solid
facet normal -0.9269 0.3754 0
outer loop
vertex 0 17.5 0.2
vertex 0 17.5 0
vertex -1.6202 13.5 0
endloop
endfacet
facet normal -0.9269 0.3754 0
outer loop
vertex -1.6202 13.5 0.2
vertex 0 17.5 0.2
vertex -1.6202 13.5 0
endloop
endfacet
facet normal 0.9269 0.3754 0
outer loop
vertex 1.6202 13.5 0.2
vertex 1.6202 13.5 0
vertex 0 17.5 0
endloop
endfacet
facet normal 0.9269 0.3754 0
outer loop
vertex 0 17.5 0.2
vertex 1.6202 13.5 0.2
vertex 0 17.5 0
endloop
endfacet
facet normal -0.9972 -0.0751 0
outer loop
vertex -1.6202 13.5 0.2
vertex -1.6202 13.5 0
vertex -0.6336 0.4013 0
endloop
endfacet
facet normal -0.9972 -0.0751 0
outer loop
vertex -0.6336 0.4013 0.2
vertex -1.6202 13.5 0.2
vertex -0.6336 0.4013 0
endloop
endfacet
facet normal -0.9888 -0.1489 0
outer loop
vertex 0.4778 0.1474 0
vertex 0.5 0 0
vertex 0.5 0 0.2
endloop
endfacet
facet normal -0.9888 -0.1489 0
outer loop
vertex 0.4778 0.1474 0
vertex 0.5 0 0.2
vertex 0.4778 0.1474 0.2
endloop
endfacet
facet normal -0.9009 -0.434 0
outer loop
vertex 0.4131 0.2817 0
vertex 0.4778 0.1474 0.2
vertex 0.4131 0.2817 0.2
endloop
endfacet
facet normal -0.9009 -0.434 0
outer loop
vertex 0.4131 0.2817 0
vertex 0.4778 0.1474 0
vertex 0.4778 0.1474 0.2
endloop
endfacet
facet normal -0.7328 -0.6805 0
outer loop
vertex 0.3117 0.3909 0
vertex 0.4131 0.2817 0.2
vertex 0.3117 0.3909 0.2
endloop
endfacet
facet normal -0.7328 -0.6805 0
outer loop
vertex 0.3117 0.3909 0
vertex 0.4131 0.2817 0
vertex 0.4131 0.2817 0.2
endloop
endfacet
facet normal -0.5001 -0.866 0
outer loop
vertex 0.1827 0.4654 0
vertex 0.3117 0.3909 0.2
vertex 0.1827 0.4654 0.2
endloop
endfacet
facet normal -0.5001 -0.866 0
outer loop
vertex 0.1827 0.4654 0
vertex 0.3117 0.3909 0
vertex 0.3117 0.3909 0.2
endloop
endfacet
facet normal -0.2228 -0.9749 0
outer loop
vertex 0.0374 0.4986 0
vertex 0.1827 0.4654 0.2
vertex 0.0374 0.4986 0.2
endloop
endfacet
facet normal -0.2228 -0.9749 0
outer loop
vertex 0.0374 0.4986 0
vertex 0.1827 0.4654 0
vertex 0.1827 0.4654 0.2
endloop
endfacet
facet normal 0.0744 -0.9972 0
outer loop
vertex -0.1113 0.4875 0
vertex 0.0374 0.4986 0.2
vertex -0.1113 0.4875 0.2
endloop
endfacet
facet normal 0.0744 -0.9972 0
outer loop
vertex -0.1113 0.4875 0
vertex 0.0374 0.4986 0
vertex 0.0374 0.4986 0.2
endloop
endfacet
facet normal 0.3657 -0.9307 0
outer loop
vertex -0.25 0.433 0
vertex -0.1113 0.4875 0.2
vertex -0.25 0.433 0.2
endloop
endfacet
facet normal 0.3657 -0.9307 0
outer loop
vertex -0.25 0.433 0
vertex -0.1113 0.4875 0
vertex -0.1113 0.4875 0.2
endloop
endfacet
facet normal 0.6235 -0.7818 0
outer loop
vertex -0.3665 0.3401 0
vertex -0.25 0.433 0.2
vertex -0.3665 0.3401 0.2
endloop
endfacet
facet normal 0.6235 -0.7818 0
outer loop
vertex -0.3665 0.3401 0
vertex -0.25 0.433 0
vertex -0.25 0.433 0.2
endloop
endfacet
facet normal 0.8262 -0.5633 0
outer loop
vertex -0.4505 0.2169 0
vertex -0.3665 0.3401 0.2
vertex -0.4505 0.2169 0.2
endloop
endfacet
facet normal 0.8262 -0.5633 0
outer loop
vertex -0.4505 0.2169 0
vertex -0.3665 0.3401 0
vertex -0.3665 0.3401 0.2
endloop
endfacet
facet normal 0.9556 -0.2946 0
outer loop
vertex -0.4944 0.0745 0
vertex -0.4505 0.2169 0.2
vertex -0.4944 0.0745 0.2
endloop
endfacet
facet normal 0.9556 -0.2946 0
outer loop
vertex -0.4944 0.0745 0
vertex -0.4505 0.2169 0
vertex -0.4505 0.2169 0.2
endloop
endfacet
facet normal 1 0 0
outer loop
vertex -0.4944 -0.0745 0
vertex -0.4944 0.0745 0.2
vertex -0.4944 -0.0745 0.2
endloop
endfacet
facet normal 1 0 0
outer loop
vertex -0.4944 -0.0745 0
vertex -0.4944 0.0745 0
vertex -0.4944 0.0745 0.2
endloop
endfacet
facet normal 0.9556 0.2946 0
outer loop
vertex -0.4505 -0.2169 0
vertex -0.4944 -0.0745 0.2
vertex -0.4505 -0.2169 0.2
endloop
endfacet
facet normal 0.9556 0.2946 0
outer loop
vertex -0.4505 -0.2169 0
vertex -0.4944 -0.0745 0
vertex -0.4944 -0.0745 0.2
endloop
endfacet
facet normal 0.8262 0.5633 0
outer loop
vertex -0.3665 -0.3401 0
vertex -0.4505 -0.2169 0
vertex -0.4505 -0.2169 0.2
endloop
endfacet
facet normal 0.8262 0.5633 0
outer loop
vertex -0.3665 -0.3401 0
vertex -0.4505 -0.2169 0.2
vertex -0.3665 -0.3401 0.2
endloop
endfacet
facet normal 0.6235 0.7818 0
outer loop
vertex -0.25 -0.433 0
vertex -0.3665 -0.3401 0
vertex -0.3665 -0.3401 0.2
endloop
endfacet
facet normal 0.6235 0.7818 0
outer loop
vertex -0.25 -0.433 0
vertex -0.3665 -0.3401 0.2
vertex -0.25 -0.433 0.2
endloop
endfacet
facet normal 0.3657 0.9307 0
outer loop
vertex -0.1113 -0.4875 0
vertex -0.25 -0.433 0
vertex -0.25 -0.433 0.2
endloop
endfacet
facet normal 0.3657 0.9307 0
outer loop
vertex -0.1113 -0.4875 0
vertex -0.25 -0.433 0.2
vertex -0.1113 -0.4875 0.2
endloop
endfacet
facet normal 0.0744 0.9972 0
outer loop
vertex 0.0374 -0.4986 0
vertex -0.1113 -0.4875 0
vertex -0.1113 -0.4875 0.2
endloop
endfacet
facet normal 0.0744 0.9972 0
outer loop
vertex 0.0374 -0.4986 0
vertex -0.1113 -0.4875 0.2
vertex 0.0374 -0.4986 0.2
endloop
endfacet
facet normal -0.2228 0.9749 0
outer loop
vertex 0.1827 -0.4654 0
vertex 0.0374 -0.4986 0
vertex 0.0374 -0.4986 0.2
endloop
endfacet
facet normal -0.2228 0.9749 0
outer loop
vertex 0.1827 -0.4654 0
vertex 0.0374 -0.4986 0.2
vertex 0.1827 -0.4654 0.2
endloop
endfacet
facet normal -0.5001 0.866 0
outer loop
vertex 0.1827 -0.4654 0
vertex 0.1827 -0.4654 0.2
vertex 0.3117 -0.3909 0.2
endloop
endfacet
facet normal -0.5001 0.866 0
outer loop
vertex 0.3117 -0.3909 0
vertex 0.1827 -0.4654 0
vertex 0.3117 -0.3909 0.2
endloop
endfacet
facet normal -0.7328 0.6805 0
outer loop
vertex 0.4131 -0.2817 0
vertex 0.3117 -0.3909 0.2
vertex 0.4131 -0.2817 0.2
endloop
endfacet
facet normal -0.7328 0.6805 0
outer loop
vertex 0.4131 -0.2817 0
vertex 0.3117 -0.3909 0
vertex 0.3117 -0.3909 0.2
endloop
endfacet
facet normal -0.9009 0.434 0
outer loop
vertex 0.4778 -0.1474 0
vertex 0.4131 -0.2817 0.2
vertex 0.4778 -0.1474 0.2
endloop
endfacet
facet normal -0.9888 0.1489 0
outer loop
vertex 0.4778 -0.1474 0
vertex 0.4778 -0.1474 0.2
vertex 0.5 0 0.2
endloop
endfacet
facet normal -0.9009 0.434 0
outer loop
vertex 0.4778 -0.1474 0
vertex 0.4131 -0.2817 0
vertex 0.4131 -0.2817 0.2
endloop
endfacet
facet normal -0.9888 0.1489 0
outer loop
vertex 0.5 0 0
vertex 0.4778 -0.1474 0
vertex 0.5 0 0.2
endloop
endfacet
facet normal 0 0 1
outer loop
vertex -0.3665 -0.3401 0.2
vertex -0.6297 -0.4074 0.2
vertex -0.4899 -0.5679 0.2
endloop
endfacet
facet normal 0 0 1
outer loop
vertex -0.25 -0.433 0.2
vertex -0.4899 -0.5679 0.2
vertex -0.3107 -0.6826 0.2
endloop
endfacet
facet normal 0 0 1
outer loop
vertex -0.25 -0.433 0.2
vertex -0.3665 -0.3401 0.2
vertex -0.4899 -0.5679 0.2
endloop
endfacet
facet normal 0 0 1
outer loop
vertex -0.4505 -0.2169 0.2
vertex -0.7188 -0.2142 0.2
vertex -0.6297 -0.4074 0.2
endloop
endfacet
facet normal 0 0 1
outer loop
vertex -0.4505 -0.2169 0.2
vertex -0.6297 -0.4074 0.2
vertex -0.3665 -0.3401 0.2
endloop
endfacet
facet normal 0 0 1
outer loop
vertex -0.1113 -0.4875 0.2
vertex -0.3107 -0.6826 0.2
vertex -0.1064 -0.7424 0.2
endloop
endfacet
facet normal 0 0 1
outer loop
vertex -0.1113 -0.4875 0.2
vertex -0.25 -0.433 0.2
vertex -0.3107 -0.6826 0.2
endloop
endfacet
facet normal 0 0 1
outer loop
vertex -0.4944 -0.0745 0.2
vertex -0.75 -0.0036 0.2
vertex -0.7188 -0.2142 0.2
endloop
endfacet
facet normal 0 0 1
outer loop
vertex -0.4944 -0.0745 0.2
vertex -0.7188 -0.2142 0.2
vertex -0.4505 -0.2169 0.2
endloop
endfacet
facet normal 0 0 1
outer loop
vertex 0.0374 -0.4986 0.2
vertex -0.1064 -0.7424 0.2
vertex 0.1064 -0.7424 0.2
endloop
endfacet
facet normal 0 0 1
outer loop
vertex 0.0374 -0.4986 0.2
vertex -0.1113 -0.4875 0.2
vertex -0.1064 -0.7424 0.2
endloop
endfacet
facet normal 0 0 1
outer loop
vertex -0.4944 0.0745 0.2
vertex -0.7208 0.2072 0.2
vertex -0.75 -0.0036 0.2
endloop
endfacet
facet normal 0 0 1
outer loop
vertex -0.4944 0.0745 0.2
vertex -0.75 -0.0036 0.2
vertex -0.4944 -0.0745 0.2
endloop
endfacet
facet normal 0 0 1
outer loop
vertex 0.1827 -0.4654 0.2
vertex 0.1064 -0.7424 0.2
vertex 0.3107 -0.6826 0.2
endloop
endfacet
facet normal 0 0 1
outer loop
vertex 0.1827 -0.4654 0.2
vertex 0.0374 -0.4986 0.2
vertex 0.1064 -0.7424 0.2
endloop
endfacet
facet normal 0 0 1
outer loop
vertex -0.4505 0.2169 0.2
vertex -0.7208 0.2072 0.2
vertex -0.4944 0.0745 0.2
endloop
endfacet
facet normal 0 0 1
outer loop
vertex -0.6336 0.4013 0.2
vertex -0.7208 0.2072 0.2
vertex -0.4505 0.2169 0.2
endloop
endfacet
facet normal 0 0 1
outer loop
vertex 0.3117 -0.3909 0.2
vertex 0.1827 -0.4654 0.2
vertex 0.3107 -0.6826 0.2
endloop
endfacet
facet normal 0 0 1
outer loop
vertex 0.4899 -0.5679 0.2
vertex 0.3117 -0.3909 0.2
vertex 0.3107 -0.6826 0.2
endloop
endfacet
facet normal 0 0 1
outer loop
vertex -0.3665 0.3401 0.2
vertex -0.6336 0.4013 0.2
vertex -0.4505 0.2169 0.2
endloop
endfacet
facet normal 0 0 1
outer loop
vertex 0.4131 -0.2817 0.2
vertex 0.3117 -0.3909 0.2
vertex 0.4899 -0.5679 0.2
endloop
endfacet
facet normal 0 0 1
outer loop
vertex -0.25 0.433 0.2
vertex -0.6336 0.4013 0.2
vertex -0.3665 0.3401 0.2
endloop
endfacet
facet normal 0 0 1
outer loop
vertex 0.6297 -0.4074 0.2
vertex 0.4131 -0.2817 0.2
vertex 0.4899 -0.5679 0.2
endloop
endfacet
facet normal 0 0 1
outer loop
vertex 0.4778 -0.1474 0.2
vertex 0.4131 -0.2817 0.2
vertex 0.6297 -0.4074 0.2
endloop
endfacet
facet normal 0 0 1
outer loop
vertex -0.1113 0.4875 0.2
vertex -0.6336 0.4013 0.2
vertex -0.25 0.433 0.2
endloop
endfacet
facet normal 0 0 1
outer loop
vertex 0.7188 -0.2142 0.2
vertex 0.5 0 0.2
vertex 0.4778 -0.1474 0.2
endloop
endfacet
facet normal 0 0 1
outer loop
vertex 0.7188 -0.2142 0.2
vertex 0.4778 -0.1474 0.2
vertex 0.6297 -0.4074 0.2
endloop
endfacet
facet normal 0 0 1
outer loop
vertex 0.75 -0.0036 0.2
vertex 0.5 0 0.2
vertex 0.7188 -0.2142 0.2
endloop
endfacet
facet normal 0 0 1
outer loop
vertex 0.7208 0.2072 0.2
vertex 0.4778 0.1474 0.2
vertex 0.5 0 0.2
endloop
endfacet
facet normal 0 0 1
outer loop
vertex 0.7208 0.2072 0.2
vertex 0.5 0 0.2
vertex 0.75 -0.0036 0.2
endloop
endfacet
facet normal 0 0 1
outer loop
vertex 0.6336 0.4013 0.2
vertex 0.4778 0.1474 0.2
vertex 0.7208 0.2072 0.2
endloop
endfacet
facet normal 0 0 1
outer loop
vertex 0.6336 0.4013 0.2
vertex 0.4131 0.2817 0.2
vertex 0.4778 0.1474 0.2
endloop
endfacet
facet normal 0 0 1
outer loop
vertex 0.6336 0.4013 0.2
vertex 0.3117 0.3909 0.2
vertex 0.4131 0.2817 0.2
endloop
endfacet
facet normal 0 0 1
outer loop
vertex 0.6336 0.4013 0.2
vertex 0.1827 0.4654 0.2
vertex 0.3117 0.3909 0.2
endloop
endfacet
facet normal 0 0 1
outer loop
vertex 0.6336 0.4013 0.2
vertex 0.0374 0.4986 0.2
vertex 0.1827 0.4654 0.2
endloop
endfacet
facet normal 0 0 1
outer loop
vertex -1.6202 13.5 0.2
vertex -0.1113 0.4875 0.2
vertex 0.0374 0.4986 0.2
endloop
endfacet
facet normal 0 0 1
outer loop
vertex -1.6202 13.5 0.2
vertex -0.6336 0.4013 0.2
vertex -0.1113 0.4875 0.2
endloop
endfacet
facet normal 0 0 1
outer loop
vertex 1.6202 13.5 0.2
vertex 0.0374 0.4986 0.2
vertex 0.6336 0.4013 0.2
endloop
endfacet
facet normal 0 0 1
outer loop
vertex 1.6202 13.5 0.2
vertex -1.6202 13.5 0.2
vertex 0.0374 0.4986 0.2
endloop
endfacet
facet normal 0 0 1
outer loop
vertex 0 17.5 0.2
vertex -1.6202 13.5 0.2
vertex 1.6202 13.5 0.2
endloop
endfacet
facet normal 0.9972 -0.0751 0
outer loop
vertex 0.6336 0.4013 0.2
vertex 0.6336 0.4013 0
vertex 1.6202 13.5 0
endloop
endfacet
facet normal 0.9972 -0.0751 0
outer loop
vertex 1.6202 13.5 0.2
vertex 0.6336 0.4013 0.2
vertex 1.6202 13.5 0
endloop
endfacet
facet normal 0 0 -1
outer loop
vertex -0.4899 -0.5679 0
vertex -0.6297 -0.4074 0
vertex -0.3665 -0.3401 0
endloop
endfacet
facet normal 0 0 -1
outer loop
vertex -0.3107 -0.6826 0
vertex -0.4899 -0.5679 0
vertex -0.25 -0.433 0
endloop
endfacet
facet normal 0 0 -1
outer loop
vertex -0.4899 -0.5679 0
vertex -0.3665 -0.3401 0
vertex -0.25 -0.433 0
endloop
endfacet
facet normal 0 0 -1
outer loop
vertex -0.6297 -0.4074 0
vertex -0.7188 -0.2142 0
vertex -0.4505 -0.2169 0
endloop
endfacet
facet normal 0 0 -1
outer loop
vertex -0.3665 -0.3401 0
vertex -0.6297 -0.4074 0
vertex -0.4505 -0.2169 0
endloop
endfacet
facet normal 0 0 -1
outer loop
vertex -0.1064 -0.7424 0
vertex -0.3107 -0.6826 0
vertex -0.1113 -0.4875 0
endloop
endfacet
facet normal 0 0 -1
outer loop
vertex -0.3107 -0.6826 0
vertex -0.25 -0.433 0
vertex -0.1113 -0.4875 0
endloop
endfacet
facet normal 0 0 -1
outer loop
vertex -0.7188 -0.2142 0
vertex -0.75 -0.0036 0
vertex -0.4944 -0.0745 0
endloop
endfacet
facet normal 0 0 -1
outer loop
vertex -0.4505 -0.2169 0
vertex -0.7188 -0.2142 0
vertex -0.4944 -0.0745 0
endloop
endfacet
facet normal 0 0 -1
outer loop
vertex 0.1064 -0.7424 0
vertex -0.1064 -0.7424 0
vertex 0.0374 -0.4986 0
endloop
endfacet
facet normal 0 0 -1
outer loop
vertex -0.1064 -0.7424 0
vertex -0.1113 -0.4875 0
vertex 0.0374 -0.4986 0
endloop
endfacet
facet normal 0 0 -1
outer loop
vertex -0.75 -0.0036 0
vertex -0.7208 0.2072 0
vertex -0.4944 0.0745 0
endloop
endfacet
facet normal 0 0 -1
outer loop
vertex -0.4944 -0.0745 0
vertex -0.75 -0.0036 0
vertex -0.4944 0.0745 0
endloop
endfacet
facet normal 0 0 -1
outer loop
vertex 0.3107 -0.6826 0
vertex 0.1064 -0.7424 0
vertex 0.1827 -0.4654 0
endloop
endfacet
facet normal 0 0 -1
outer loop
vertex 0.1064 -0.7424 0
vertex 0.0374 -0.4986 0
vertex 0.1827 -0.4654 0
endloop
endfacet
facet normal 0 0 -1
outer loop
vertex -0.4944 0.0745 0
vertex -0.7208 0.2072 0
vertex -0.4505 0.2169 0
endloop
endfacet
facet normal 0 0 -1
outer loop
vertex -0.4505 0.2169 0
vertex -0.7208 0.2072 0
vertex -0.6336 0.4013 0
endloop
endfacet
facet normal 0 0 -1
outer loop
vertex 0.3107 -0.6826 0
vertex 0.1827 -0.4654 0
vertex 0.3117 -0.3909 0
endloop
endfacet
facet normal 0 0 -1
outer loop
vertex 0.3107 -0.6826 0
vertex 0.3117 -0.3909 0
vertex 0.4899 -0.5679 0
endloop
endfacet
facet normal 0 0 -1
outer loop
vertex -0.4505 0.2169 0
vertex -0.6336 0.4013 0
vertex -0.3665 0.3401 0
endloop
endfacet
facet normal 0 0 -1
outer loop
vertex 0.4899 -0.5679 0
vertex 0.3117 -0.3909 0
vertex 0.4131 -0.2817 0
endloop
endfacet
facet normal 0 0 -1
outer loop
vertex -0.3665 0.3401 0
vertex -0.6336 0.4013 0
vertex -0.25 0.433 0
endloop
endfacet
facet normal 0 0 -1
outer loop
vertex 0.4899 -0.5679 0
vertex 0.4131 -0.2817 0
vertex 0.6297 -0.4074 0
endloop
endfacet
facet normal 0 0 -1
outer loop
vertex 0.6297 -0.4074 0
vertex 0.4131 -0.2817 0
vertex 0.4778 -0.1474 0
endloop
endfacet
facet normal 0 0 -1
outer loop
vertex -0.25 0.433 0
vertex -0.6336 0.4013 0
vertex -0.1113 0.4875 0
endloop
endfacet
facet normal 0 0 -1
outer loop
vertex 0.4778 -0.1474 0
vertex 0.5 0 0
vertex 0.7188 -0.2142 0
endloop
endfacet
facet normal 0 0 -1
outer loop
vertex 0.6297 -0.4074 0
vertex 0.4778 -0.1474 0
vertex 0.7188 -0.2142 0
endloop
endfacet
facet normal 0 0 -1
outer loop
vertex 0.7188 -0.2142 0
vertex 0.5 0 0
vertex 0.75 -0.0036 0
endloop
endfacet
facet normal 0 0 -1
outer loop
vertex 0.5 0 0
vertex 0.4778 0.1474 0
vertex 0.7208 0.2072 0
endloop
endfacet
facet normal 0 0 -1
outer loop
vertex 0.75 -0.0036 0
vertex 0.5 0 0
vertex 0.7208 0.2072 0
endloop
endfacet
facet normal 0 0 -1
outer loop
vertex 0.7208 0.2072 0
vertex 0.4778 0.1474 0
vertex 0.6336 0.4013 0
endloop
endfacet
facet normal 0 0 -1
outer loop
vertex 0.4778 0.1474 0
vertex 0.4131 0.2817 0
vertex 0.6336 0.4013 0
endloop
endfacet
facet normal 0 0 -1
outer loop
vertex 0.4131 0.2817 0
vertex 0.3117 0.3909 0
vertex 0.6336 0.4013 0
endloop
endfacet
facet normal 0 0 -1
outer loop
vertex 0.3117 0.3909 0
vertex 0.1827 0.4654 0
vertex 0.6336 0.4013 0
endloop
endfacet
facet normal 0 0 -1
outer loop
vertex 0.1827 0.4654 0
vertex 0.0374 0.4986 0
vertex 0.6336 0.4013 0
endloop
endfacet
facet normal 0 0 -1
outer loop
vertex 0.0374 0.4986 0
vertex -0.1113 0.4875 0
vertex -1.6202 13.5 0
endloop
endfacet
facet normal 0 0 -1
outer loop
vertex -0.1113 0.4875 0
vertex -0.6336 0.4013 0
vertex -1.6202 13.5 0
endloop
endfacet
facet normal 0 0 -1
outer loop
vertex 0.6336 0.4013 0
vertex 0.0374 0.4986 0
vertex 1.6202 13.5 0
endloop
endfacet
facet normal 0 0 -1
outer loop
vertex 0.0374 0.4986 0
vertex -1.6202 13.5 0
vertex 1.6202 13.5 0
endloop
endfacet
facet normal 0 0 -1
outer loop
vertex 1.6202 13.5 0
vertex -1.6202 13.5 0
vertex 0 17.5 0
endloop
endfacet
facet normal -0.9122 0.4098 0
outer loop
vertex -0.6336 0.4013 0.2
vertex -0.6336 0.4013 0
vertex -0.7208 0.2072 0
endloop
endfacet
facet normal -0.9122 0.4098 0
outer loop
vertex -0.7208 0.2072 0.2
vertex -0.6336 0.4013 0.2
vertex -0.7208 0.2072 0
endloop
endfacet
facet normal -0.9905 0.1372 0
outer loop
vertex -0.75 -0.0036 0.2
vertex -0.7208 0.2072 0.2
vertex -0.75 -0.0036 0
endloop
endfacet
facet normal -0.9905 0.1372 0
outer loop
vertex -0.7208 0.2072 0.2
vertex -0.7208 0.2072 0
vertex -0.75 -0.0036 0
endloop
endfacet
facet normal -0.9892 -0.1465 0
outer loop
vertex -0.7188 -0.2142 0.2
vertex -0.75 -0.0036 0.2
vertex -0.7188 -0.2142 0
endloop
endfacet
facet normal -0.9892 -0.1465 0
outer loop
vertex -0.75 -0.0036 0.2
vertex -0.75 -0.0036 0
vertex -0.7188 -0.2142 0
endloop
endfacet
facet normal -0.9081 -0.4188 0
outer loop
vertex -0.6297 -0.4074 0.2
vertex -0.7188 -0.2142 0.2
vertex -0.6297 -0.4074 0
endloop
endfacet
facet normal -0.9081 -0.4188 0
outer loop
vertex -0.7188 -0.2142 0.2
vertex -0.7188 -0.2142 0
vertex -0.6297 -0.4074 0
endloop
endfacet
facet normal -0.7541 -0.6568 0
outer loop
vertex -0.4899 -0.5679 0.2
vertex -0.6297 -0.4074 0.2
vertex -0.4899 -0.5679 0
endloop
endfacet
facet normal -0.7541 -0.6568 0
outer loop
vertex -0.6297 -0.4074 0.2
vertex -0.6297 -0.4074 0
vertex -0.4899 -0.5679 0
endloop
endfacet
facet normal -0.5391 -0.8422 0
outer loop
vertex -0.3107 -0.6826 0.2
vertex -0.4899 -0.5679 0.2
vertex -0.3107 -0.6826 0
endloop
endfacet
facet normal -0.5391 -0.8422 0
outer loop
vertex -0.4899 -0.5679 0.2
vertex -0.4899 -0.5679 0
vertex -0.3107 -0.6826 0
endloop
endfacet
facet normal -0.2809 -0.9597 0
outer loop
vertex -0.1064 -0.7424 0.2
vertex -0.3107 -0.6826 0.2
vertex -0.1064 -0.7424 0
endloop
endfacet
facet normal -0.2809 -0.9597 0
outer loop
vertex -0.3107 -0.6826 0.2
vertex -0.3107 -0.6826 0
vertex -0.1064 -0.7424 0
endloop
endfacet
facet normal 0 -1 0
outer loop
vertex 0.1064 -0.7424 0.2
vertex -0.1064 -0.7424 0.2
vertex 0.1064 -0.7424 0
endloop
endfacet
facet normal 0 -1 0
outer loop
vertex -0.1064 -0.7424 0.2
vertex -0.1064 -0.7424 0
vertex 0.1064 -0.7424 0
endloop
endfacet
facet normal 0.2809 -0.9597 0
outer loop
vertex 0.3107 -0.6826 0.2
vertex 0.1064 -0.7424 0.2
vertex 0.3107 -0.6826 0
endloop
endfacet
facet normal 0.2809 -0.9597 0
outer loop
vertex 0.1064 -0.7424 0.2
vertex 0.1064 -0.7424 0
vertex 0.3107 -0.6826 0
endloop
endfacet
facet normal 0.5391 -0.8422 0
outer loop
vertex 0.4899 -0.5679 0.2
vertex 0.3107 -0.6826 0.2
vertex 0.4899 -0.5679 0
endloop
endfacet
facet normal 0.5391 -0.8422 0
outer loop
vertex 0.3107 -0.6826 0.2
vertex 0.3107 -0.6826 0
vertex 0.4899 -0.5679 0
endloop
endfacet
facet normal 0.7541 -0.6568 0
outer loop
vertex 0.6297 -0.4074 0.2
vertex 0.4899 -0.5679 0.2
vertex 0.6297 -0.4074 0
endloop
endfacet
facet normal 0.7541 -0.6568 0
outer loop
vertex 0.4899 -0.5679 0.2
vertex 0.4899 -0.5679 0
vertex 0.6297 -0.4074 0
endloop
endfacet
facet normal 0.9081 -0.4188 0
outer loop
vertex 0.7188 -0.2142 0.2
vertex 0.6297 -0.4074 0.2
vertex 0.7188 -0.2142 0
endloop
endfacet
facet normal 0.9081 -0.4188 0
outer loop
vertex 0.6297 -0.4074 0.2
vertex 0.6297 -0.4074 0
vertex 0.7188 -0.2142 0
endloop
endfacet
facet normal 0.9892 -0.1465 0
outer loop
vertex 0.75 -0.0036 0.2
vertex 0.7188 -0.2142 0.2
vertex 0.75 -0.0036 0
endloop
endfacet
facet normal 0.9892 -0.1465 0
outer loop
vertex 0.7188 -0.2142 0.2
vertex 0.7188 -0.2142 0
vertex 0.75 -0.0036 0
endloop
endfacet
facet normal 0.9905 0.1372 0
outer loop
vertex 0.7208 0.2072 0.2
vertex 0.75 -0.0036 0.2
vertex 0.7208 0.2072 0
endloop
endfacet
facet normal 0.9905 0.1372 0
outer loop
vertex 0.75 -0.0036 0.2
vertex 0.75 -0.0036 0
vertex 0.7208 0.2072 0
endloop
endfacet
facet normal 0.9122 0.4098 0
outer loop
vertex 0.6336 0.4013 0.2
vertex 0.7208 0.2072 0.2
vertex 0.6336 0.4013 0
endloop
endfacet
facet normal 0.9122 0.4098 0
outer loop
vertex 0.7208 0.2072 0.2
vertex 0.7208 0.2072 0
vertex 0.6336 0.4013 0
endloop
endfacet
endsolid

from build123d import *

# Parameters (mm, degrees)
CROQUIS1_R              = 0.5
SALIENTE_EXTRUIR2_DEPTH = 0.2


with BuildPart() as part:
    # Croquis1 → Saliente-Extruir2 (new body)
    with BuildSketch(Plane.XY):
        with BuildLine():
            Line((-1.620168748, 13.5), (-0.633616905, 0.401284958))
            ThreePointArc((-0.633616905, 0.401284958), (0, -0.75), (0.633616905, 0.401284958))
            Line((0.633616905, 0.401284958), (1.620168748, 13.5))
            Line((1.620168748, 13.5), (0, 17.5))
            Line((0, 17.5), (-1.620168748, 13.5))
        make_face()
        Circle(CROQUIS1_R, mode=Mode.SUBTRACT)
    extrude(amount=SALIENTE_EXTRUIR2_DEPTH)


solid = part.part
